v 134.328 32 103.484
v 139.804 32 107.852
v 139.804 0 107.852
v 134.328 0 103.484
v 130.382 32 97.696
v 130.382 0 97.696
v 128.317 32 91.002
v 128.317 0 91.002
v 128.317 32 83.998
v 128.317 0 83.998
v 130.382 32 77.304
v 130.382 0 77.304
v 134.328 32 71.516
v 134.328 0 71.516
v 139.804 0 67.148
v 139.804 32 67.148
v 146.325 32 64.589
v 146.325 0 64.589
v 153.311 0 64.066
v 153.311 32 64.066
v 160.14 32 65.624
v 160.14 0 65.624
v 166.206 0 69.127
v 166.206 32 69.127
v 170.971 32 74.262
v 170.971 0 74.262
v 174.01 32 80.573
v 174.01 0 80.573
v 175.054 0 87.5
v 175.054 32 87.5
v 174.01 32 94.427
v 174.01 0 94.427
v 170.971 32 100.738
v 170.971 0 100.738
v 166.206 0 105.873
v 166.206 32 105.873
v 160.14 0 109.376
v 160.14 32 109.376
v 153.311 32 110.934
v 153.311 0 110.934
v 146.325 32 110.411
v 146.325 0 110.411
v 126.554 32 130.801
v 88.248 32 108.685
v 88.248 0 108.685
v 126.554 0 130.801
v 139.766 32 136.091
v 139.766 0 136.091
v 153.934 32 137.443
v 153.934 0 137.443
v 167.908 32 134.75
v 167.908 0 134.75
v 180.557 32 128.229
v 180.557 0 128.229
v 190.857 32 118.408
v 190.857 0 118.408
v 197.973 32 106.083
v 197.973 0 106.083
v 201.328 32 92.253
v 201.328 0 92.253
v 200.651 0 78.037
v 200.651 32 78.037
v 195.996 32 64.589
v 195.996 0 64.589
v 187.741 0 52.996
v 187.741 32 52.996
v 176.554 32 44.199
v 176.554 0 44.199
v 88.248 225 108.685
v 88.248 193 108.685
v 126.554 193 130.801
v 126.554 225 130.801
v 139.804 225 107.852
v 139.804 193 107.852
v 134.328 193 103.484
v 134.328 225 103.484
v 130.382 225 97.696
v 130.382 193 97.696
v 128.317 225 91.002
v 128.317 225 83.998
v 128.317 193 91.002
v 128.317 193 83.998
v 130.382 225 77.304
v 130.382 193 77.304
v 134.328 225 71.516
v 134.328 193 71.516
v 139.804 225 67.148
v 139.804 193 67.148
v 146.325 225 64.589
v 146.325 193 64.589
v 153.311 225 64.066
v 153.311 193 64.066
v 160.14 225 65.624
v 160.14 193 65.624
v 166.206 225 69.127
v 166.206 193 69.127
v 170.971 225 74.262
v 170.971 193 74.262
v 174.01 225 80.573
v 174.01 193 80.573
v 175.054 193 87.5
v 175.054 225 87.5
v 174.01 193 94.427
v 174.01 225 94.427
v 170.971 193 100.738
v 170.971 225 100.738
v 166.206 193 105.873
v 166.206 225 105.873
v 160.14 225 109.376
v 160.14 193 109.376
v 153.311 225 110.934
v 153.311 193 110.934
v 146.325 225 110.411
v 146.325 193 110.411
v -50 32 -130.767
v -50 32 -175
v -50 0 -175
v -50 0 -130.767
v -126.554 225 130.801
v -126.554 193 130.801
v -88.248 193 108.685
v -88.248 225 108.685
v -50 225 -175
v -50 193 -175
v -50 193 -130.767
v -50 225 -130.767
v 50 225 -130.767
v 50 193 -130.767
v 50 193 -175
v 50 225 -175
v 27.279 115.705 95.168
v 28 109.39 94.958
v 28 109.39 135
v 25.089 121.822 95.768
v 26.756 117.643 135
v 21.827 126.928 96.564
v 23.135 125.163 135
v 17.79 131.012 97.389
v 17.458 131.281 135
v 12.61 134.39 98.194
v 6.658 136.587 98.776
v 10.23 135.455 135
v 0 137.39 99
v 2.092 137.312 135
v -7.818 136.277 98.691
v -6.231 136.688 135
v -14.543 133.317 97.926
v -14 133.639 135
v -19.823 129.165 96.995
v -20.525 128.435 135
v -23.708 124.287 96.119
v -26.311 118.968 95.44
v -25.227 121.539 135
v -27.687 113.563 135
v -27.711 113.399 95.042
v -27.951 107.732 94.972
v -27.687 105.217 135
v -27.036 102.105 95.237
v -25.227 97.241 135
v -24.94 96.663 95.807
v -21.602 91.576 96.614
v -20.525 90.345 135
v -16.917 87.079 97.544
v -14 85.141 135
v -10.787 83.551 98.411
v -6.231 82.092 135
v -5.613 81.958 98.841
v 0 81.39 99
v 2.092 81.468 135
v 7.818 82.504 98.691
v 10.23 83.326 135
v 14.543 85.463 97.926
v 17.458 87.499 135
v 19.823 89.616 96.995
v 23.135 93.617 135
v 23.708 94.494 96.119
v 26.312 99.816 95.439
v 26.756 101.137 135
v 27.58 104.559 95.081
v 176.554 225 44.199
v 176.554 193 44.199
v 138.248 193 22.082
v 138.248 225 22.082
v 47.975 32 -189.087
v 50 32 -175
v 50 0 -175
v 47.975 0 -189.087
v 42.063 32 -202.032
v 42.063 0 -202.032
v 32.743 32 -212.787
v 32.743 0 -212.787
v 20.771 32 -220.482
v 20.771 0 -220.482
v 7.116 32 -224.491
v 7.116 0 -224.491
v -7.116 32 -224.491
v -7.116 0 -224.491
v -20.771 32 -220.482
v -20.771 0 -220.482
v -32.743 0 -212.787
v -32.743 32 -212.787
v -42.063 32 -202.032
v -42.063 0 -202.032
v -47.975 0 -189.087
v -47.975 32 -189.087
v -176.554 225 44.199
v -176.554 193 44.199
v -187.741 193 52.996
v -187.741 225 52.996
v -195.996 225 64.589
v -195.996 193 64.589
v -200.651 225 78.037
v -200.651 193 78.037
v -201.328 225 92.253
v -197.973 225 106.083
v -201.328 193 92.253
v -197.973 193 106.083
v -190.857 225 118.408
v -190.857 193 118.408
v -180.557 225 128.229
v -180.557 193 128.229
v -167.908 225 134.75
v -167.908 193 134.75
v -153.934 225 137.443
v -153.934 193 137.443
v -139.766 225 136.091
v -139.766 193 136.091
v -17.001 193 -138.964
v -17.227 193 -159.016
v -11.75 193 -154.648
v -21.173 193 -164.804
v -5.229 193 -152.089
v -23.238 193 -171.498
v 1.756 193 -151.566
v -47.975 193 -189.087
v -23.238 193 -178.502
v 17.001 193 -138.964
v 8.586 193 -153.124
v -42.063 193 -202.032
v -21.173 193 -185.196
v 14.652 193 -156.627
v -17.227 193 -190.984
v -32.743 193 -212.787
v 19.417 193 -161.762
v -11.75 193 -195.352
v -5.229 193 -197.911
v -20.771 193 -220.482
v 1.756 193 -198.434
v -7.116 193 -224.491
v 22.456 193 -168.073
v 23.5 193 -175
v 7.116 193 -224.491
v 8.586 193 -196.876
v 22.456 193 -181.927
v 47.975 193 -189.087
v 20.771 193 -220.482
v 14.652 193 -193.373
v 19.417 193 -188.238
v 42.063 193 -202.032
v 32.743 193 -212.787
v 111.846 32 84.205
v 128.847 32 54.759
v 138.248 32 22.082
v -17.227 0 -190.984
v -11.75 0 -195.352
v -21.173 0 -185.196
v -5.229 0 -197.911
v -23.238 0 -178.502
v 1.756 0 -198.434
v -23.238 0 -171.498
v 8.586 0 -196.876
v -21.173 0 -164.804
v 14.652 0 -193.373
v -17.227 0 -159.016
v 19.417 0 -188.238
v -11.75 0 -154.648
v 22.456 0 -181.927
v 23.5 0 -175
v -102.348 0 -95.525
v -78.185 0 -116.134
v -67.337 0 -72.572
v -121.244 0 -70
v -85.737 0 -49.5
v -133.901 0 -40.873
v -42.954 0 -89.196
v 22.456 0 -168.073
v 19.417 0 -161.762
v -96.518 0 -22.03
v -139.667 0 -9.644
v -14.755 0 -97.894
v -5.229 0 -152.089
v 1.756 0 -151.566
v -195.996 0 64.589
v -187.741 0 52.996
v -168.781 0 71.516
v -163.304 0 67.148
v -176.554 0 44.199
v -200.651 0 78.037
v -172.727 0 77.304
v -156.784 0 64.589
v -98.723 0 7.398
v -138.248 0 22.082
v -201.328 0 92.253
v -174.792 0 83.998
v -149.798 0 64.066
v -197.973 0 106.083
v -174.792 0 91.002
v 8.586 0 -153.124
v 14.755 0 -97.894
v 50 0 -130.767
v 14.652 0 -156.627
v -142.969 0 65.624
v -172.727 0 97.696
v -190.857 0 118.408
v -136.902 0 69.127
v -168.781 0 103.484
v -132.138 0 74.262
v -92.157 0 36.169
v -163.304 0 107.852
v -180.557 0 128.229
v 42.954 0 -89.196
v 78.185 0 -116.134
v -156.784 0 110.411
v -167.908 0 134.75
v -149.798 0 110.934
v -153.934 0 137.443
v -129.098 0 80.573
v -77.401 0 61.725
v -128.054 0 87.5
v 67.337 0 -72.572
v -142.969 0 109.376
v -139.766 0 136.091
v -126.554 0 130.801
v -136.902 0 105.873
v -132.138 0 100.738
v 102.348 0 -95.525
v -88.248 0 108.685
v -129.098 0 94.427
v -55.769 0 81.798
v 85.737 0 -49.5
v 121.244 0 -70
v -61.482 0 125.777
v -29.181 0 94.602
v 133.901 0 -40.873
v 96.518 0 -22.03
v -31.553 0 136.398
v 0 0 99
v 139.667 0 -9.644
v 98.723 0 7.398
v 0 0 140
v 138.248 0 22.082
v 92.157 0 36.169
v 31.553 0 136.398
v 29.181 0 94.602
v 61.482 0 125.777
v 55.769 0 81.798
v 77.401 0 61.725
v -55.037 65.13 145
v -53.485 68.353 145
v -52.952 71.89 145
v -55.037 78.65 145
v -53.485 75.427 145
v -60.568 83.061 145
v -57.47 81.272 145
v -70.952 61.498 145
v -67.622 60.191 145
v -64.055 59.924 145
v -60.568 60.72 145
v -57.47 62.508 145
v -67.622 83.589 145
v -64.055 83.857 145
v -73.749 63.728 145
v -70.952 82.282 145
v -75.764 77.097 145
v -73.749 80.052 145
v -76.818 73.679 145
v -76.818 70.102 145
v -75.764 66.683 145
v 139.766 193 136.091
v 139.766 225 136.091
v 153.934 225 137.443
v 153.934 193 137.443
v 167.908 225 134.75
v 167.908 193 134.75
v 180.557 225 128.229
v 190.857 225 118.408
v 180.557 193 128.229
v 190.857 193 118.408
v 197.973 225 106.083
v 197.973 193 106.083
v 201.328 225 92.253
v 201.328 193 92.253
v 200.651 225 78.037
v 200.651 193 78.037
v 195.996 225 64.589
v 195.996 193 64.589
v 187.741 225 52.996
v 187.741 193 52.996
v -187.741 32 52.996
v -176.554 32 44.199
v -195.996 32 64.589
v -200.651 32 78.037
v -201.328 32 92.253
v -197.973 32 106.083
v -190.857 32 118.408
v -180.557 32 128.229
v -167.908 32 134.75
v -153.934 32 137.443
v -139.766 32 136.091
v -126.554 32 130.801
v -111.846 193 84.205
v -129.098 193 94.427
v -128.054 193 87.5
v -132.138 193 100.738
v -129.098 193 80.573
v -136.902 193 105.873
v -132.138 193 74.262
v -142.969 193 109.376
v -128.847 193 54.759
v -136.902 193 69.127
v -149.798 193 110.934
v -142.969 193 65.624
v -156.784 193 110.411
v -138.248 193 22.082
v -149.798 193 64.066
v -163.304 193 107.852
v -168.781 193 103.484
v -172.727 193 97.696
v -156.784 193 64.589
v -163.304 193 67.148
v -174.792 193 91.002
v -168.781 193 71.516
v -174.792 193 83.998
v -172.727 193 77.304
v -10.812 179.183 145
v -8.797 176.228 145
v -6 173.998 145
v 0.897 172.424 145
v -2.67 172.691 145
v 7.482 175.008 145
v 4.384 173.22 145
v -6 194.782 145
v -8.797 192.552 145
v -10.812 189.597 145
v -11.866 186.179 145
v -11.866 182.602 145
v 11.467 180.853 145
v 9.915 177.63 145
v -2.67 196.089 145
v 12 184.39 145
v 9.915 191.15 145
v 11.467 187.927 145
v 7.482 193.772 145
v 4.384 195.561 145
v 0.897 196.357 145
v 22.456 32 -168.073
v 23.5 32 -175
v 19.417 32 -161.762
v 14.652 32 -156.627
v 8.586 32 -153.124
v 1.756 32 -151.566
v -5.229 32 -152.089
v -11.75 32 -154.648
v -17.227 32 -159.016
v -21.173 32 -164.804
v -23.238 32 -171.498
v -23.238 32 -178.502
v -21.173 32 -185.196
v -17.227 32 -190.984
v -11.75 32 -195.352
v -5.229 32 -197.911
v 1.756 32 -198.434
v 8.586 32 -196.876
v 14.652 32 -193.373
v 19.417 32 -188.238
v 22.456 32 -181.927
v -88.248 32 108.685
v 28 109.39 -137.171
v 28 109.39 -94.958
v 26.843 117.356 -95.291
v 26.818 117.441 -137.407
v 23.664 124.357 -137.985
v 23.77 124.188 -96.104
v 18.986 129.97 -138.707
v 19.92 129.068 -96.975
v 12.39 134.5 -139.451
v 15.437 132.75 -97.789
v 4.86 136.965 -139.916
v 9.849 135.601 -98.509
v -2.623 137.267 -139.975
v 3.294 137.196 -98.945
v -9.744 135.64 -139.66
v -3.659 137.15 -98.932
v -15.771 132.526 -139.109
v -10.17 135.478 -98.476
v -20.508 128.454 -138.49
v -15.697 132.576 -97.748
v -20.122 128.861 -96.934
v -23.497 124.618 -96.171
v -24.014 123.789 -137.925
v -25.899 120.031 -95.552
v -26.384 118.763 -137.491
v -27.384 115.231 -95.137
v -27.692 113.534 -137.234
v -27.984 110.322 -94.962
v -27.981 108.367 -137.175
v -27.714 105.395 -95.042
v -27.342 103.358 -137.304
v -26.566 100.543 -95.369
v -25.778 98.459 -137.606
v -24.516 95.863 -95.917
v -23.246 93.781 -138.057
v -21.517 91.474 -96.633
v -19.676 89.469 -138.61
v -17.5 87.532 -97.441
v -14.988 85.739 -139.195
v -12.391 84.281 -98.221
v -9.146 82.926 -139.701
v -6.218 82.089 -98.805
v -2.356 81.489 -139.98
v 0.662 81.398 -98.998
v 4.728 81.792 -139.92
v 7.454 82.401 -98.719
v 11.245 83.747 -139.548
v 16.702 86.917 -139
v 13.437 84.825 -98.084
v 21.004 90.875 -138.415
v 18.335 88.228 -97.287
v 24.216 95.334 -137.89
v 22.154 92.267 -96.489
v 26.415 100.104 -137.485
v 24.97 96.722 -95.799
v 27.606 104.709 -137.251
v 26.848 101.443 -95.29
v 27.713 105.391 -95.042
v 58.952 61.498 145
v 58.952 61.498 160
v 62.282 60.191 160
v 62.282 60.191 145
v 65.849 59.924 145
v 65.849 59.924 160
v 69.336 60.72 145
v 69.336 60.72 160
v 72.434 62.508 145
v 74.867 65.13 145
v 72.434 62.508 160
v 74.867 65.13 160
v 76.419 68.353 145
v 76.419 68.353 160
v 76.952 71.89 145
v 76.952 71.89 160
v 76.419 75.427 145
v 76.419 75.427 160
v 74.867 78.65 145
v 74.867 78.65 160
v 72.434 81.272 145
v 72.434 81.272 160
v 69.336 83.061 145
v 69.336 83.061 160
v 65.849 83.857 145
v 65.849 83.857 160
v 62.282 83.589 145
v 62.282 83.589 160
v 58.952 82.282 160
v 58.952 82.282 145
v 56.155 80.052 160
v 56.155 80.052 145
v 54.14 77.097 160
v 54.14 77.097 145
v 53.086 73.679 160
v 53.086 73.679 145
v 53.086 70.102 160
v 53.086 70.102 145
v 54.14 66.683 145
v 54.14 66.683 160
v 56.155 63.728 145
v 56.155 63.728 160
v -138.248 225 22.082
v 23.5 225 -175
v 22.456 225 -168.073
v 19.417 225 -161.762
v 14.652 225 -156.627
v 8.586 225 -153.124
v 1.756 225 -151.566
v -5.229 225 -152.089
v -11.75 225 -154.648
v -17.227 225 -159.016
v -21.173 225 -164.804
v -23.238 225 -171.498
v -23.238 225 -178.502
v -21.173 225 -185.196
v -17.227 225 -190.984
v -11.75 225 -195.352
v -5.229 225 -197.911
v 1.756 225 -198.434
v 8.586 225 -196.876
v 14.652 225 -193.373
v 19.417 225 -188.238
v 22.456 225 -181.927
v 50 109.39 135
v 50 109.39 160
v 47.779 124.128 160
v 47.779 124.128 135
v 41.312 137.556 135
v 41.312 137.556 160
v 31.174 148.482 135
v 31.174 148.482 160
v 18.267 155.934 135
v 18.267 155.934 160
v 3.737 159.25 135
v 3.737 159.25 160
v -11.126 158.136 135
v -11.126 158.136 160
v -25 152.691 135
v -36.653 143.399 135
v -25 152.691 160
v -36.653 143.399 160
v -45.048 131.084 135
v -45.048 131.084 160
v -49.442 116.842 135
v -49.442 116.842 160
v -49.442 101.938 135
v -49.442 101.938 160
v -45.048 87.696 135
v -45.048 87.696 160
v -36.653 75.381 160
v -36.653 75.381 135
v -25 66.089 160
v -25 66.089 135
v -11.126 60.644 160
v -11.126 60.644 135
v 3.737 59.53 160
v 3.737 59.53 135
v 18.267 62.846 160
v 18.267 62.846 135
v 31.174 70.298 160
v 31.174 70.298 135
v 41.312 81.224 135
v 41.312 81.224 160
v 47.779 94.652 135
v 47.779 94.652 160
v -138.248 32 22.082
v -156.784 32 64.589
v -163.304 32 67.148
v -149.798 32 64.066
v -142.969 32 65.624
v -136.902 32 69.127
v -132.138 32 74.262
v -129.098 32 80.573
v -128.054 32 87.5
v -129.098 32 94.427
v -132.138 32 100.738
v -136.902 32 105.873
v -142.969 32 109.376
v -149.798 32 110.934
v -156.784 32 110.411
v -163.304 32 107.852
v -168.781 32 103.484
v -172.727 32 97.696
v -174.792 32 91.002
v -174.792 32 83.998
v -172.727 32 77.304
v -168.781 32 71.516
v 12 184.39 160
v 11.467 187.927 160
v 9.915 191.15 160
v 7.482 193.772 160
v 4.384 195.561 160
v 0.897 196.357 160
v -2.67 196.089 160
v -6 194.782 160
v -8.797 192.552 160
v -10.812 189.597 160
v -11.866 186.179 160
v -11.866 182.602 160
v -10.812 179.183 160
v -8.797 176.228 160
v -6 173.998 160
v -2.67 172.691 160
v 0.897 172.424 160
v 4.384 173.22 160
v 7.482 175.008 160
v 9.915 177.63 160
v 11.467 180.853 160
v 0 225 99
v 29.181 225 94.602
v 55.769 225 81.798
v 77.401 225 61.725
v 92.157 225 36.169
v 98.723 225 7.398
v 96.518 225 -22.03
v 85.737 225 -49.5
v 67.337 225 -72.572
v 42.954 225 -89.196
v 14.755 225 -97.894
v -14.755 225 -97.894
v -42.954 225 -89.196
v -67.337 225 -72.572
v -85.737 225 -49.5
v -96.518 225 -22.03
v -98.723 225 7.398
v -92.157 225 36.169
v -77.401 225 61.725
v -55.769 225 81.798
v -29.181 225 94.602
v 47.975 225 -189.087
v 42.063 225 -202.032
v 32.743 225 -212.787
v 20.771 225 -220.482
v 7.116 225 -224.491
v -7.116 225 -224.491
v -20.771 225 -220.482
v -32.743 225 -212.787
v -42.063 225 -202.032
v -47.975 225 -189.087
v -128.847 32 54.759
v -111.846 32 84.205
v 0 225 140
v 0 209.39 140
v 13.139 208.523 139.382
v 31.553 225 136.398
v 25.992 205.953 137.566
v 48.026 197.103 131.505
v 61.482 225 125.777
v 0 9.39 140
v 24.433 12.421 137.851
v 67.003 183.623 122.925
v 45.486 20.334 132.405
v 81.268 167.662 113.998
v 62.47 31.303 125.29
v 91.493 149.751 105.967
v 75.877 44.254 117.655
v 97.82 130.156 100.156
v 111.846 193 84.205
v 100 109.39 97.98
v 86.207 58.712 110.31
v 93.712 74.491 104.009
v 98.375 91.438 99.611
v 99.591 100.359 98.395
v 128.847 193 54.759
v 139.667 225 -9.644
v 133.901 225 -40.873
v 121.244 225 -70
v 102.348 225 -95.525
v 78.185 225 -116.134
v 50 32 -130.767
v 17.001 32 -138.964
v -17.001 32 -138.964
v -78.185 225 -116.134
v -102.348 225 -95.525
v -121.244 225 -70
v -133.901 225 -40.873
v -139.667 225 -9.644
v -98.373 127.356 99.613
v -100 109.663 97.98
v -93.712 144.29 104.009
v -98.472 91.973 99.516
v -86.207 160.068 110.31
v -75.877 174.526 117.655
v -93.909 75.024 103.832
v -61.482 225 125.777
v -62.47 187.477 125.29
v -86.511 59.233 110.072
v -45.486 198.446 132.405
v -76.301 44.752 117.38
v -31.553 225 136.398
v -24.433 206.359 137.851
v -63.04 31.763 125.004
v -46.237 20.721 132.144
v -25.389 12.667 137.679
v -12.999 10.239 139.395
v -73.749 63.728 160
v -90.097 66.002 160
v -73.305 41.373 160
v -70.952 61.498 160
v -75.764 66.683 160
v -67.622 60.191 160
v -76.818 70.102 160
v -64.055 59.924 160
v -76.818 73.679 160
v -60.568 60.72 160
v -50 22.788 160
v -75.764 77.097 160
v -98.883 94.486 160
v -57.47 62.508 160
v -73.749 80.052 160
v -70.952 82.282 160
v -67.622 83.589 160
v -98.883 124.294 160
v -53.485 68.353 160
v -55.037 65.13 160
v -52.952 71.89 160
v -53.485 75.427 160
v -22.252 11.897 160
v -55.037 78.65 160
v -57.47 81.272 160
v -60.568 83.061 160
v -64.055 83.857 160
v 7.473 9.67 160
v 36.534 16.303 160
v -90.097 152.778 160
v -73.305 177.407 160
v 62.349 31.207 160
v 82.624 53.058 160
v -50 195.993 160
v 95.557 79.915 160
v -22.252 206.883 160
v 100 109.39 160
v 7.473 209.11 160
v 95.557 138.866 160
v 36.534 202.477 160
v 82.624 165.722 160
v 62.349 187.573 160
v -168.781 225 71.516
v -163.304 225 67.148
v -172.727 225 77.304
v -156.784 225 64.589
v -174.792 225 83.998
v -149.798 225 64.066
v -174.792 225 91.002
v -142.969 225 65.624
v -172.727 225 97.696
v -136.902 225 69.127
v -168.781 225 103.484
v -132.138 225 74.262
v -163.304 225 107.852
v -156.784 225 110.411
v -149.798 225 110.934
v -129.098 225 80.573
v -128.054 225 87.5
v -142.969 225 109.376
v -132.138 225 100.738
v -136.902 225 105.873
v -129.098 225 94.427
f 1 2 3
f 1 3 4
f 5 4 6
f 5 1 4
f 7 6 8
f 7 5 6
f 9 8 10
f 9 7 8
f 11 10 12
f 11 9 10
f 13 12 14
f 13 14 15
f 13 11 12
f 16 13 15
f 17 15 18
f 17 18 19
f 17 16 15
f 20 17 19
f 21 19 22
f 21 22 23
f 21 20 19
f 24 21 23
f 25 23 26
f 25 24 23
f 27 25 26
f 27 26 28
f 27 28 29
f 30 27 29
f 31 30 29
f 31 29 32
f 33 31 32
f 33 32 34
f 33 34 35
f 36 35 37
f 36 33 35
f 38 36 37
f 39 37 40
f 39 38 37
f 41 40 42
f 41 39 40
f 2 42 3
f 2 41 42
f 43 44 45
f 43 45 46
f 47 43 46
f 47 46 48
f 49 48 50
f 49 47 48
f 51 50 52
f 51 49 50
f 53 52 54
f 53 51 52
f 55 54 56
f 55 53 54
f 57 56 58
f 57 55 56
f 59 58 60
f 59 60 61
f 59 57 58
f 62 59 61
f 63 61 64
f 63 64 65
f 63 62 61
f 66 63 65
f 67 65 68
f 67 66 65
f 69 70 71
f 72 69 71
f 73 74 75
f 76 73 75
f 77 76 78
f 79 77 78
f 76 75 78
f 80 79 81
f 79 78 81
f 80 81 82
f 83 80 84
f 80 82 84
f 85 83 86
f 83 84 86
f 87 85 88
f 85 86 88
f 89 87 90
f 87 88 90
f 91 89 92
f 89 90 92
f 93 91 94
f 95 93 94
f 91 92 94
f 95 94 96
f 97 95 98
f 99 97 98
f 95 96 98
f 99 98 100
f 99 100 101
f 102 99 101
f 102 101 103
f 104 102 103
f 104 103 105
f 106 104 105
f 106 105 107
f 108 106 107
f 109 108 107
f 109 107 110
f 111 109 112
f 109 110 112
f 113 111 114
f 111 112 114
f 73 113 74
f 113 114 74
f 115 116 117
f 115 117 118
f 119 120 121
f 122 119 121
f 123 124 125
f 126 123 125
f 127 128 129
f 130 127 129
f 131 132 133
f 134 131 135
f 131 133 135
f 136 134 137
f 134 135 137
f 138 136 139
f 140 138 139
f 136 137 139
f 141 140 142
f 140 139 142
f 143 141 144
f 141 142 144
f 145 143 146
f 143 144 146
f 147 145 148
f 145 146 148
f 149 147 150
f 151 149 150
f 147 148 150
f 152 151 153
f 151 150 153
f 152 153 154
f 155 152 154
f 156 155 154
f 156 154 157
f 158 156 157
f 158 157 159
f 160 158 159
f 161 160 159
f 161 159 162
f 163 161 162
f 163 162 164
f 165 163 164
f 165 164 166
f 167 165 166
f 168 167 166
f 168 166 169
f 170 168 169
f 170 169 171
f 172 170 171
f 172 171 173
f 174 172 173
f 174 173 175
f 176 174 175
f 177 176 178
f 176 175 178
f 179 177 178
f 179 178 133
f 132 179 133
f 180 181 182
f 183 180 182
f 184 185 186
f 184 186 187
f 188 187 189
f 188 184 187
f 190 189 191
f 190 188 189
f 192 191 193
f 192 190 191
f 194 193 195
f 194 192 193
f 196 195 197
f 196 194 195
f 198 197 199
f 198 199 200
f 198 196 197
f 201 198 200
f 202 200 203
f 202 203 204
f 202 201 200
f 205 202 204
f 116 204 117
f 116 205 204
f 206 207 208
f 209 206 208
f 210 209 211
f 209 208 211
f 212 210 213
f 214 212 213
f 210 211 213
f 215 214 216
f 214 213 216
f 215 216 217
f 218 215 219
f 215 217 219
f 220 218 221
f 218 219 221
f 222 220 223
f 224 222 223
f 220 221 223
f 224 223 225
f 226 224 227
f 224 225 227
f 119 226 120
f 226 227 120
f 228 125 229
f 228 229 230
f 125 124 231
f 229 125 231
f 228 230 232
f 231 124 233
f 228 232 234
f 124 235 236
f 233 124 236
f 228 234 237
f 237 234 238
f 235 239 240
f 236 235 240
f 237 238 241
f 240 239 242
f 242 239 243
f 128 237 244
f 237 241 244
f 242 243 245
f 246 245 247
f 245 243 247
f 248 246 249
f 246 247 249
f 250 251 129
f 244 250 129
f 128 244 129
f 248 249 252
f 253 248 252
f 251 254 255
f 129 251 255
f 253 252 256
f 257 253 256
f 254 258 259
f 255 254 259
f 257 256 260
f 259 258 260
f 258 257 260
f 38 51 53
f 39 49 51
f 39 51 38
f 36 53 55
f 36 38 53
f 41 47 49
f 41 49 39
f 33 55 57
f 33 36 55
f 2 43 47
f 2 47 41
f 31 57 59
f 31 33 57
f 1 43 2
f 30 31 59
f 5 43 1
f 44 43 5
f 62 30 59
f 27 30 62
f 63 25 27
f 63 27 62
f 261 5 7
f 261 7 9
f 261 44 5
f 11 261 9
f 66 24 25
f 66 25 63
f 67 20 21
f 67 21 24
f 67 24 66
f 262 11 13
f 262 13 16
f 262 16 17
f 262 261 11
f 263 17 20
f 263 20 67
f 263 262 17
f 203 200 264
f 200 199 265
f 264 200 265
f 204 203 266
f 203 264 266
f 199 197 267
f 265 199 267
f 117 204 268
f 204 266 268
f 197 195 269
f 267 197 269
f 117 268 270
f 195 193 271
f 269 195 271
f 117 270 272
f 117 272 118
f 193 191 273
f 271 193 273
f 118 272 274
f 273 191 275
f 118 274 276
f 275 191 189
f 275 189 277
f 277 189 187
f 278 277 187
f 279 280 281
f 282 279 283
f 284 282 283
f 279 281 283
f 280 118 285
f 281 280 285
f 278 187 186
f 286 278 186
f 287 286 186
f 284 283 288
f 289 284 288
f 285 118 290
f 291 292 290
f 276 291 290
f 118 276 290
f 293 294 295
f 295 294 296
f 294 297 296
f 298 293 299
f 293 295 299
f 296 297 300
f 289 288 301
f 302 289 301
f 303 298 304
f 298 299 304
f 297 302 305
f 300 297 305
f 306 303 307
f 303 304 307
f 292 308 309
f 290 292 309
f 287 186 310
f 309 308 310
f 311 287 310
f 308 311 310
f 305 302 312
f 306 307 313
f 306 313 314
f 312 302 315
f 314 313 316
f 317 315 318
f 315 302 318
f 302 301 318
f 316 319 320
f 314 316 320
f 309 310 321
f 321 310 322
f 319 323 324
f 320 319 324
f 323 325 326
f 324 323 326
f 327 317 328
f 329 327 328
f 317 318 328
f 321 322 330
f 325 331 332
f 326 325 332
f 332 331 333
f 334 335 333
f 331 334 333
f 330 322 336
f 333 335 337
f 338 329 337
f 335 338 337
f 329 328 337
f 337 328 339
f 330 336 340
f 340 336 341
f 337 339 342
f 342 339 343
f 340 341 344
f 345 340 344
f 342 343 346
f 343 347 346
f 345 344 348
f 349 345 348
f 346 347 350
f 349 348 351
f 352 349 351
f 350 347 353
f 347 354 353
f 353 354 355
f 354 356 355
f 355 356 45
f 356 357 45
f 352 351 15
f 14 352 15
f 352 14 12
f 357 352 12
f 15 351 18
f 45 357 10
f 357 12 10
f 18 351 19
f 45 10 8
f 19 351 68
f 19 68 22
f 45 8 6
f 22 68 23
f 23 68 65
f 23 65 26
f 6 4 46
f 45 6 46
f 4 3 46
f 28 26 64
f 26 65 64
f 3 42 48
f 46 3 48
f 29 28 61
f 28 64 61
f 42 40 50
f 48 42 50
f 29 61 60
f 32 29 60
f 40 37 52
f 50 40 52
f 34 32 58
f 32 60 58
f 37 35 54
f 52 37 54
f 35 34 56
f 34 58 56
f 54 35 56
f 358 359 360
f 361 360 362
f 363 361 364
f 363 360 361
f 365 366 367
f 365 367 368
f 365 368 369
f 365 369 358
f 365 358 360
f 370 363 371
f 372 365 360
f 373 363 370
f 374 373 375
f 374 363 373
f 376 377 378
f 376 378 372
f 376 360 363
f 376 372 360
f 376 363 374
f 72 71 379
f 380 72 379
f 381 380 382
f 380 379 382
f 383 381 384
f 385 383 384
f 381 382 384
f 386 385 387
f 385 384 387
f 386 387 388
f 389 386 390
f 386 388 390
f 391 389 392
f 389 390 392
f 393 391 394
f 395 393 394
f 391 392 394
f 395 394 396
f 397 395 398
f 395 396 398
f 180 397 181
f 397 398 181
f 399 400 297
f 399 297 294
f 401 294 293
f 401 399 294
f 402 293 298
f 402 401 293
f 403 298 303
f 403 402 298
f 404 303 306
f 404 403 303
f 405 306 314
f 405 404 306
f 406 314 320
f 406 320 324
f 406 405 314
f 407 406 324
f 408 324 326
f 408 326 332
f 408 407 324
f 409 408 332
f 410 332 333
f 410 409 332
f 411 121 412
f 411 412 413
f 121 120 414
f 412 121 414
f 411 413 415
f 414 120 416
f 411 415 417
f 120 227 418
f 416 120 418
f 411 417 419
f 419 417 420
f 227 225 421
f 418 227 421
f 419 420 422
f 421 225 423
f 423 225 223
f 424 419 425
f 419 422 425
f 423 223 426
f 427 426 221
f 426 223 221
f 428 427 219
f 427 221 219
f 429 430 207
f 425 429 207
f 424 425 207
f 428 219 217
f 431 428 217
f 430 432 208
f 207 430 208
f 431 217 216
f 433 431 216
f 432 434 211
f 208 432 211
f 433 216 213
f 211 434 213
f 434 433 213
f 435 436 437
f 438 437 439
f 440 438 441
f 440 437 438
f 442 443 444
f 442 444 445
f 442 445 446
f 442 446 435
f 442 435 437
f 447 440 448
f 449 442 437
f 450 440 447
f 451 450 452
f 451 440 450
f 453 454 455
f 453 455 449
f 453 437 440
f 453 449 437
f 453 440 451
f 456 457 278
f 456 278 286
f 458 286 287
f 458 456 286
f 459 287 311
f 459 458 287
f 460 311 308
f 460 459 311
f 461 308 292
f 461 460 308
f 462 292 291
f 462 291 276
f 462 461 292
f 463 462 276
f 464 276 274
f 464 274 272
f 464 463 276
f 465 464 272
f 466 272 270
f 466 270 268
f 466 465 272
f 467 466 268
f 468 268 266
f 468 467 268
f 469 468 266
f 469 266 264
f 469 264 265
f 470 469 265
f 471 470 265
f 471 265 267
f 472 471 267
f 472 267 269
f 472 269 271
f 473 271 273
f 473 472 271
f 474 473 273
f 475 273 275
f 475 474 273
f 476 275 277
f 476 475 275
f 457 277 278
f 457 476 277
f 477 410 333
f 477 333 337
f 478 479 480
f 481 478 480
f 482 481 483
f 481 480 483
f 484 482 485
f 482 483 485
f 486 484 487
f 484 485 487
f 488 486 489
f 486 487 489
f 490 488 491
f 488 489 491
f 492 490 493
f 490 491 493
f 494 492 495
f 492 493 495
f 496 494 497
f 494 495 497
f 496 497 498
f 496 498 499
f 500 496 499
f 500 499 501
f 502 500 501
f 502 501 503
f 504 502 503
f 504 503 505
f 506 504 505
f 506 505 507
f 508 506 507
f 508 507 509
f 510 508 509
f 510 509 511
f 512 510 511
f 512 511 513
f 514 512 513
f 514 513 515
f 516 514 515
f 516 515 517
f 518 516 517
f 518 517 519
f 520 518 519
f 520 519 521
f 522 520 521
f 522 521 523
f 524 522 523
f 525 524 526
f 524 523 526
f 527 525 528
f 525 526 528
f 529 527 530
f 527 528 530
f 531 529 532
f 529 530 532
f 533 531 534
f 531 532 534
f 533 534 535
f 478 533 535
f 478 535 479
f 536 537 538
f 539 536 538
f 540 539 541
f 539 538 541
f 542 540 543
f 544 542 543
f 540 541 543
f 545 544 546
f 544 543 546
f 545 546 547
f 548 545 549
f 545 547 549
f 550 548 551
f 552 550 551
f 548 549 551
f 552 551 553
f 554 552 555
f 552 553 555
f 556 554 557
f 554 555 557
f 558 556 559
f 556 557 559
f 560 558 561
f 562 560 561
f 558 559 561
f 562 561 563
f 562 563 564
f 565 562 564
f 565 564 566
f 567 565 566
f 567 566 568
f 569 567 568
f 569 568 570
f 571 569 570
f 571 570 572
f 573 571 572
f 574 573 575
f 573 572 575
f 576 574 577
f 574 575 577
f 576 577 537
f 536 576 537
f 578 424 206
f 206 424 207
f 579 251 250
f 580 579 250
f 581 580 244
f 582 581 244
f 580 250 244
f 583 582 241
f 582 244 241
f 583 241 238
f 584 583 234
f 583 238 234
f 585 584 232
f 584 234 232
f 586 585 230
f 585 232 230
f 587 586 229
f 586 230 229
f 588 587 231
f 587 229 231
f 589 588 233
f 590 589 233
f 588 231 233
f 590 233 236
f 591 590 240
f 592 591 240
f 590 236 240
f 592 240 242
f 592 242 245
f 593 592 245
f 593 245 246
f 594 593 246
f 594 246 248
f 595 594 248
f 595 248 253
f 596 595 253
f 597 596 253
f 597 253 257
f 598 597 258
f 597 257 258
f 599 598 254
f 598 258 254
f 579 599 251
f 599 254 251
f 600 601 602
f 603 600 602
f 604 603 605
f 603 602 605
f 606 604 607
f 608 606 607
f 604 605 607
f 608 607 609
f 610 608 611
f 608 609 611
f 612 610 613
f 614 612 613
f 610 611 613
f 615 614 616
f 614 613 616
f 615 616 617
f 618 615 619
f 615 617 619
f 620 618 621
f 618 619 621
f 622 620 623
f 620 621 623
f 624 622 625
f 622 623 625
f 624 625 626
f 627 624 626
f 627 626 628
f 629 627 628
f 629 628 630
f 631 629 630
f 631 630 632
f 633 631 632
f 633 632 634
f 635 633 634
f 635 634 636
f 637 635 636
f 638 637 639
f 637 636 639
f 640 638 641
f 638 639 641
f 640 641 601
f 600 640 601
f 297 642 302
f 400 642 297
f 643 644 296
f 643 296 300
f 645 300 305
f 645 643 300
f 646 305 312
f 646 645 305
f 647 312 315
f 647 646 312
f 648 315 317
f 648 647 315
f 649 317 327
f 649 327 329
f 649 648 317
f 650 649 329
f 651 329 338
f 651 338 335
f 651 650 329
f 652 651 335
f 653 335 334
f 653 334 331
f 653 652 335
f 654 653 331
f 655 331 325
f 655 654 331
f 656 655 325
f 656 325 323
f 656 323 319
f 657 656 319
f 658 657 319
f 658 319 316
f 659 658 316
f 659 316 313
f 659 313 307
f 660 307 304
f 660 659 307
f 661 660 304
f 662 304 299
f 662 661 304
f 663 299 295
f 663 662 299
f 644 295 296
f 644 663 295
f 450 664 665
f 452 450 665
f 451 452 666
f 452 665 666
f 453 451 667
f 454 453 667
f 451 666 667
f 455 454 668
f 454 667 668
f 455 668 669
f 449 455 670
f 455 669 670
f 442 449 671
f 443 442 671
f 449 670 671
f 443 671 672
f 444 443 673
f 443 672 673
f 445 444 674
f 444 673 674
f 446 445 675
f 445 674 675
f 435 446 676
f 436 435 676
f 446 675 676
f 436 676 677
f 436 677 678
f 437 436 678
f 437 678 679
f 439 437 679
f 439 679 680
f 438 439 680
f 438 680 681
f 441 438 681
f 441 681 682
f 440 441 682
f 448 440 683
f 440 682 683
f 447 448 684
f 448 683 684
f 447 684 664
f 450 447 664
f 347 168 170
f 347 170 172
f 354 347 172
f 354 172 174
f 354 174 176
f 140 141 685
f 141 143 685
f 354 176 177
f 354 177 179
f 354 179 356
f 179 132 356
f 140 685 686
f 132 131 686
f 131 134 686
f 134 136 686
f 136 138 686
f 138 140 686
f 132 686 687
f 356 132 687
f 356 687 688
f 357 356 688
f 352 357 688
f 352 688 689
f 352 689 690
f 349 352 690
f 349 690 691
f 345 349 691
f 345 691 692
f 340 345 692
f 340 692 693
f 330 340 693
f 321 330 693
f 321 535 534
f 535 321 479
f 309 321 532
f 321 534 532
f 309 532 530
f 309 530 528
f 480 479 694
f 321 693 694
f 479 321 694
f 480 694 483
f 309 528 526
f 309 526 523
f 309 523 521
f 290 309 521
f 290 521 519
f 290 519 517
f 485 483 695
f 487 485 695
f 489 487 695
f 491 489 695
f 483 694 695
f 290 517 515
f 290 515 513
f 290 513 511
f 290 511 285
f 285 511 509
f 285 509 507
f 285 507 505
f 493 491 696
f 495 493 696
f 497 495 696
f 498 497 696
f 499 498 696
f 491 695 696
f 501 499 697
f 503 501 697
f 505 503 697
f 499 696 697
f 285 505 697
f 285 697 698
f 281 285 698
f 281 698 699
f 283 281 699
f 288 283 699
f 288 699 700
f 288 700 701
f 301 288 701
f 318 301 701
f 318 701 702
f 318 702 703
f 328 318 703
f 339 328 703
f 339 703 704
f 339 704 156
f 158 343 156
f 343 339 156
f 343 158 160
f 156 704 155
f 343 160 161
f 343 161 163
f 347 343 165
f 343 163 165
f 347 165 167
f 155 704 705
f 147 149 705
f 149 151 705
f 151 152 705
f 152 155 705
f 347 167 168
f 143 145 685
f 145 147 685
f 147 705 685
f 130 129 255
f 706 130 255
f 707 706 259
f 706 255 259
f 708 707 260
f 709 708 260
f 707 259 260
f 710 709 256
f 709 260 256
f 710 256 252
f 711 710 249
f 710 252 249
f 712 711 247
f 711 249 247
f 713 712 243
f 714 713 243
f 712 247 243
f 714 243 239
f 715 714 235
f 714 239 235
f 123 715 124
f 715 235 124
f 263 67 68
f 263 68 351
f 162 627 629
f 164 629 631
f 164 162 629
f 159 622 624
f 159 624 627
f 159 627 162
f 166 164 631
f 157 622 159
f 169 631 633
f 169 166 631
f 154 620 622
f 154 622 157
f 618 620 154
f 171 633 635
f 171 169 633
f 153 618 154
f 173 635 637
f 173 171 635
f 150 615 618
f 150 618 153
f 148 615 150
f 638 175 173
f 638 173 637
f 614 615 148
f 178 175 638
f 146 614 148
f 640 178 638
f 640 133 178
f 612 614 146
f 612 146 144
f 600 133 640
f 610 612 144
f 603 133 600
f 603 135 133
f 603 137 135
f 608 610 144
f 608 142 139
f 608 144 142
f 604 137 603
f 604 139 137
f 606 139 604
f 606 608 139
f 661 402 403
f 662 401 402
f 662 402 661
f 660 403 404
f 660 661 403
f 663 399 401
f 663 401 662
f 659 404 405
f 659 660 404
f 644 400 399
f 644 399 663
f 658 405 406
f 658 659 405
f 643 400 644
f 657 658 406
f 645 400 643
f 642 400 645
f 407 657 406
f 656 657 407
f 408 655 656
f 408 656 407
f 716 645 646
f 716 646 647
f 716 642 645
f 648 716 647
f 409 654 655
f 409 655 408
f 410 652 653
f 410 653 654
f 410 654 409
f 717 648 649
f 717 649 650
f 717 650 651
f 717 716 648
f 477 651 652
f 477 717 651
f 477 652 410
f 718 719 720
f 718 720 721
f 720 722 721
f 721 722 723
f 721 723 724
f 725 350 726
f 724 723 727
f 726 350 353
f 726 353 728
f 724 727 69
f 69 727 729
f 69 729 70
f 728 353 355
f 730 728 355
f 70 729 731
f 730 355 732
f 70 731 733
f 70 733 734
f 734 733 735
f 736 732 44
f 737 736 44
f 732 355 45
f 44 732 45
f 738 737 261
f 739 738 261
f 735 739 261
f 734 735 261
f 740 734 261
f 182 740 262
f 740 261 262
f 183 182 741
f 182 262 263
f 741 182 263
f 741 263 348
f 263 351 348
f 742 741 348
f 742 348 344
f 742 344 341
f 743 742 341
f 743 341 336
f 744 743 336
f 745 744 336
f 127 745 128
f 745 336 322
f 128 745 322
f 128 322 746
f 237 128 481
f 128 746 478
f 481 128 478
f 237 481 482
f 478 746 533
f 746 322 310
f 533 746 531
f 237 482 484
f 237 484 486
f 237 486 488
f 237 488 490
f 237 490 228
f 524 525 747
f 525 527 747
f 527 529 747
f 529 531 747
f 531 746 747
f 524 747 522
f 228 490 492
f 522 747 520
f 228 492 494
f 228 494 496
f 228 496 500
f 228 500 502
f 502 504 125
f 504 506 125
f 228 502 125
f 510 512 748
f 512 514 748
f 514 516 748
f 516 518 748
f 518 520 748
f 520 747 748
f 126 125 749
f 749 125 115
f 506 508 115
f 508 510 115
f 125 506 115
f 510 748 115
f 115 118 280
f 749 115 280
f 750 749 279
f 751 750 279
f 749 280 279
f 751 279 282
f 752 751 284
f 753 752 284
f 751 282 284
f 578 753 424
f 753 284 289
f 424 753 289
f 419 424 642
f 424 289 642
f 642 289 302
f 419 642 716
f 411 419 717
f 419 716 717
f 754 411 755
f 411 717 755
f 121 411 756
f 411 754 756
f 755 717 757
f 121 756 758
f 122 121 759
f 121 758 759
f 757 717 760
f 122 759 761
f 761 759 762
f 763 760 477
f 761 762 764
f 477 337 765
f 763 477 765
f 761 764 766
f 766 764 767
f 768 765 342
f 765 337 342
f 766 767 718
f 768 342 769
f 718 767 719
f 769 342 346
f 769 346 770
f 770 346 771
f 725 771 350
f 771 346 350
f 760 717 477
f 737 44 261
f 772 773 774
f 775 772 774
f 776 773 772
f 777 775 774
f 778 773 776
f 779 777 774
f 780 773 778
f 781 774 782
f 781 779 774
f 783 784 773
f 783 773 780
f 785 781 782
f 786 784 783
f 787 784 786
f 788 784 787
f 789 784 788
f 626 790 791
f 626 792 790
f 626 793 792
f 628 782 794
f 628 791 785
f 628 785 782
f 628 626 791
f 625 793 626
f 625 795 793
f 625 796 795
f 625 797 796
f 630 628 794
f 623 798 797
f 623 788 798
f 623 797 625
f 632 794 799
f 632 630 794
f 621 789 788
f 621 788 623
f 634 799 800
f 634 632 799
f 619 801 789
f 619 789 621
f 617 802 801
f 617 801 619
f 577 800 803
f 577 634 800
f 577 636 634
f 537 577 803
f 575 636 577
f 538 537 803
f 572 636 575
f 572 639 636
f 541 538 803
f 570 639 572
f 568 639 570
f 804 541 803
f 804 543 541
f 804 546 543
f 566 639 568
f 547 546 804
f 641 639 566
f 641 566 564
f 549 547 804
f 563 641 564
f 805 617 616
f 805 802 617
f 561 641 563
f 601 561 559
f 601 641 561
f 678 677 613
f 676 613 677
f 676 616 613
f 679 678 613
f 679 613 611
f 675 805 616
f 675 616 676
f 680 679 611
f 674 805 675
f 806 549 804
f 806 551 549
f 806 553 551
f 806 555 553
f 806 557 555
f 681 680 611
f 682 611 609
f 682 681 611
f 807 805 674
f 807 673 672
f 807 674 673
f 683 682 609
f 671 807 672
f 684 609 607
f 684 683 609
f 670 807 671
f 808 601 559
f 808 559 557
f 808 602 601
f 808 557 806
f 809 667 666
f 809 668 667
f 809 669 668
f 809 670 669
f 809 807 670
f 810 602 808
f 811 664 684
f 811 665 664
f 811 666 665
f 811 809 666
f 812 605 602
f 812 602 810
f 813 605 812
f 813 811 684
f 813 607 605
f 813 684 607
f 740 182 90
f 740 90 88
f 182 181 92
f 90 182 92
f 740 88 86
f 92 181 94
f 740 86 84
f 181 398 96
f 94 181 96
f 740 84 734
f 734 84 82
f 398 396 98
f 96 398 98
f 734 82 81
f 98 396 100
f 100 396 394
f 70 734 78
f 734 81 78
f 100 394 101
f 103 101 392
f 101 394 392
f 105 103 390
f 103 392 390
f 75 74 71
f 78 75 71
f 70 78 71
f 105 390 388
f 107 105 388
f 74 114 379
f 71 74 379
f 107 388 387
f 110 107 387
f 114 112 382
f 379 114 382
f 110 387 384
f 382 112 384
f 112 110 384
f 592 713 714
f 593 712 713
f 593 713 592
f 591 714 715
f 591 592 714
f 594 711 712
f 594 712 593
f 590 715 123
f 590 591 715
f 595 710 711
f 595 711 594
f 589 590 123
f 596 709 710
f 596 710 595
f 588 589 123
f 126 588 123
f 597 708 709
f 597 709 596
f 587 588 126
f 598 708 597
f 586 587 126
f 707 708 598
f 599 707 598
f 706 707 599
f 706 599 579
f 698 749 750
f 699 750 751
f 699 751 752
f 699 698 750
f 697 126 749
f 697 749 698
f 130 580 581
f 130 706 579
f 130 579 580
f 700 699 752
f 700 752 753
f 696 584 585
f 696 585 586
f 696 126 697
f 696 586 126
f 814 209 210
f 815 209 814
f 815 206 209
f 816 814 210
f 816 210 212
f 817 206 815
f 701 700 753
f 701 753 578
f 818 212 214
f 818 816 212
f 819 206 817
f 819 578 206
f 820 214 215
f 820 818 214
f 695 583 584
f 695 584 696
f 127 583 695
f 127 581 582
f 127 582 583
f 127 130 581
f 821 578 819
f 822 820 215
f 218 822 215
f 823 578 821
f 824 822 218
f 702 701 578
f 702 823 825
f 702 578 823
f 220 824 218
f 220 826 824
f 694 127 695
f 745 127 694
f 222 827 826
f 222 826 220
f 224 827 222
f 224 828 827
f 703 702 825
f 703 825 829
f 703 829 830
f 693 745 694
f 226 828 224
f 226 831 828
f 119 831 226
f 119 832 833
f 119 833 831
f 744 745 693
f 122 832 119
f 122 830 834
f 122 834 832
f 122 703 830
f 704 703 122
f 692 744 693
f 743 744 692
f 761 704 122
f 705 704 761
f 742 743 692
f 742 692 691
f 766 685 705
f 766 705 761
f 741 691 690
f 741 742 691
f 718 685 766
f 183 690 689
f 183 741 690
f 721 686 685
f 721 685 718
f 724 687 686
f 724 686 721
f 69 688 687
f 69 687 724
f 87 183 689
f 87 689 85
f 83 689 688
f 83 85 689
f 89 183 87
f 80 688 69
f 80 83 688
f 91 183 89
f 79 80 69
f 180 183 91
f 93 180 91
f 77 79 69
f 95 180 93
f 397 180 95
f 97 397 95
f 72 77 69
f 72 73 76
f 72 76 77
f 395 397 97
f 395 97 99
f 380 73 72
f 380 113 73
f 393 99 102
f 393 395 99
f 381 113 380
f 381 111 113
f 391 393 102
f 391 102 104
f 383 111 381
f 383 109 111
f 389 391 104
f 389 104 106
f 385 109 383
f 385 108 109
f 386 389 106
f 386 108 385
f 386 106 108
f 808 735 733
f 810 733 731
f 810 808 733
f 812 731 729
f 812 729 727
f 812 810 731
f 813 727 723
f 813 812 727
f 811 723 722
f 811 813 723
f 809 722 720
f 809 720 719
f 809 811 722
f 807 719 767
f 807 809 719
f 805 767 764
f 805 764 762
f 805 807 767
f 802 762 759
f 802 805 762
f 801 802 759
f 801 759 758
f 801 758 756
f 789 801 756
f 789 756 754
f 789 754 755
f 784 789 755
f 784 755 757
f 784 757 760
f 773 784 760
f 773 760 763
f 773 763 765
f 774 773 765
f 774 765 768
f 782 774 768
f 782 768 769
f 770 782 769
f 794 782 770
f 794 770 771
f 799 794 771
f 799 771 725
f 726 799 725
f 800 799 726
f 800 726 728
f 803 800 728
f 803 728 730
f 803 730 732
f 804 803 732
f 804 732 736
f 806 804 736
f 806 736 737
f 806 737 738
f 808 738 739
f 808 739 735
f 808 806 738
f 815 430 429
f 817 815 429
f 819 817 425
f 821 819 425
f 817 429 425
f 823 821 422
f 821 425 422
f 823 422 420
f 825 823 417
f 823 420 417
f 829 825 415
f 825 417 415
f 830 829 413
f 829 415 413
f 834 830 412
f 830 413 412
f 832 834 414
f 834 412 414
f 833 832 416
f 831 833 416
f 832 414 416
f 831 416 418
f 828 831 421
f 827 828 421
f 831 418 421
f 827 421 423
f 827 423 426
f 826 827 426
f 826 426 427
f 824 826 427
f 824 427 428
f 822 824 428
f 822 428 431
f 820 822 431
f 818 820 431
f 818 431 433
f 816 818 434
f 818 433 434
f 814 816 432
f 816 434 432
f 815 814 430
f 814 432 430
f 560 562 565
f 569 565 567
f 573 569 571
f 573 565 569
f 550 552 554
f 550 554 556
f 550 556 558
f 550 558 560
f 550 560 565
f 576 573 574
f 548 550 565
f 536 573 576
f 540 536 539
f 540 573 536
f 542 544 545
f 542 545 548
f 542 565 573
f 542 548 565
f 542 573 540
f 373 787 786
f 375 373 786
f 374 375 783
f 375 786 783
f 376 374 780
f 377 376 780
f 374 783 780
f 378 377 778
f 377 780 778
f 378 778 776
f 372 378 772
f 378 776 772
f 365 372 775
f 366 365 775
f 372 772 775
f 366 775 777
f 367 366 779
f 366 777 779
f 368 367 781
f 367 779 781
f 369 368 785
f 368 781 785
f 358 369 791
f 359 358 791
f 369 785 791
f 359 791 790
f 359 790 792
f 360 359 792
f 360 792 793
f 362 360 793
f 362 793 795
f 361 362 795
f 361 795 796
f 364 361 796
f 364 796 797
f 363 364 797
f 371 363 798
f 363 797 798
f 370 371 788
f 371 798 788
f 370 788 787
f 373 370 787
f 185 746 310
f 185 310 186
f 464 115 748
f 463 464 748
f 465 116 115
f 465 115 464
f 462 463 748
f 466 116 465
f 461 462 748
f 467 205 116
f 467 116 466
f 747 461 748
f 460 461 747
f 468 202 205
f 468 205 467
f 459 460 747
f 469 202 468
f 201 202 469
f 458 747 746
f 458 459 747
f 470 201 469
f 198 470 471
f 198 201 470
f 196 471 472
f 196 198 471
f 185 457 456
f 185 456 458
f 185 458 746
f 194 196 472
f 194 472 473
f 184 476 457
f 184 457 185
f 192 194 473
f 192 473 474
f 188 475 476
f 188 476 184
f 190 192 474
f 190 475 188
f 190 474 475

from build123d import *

# Parameters (mm, degrees)
SKETCH1_R                = 140
BOSS_EXTRUDE1_DEPTH      = 225
SKETCH2_R                = 99
CUT_EXTRUDE1_DEPTH       = 300.708191413
BOSS_EXTRUDE2_START      = -32
BOSS_EXTRUDE2_DEPTH      = 32
CIRPATTERN1_COUNT        = 3
CIRPATTERN2_START        = -32
CIRPATTERN2_COPY_1_DEPTH = 32
CIRPATTERN2_COPY_2_DEPTH = 32
CIRPATTERN2_COPY_3_DEPTH = 32
CIRPATTERN2_COPY_4_DEPTH = 32
BOSS_EXTRUDE3_REACH      = 491.361
BOSS_EXTRUDE3_END_RADIUS = 140
SKETCH5_R                = 100
SKETCH6_R                = 50
CUT_EXTRUDE2_DEPTH       = 25
SKETCH9_R                = 28
CUT_EXTRUDE3_DEPTH       = 490.361006427
SKETCH11_R               = 12
CUT_EXTRUDE4_DEPTH       = 15
CIRPATTERN4_COUNT        = 3


with BuildPart() as part:
    # Sketch1 → Boss-Extrude1 (new body)
    with BuildSketch(Plane(origin=(0, 0, 0), x_dir=(1, 0, 0), z_dir=(0, 1, 0))):
        with Locations(Location((0, 0, 0), (0, 0, 270))):
            Circle(SKETCH1_R)
    extrude(amount=BOSS_EXTRUDE1_DEPTH)

    # Sketch2 → Cut-Extrude1 (cut, through all)
    with BuildSketch(Plane(origin=(0, 225, 0), x_dir=(1, 0, 0), z_dir=(0, 1, 0))):
        with Locations(Location((0, 0, 0), (0, 0, 270))):
            Circle(SKETCH2_R)
    extrude(amount=-CUT_EXTRUDE1_DEPTH, mode=Mode.SUBTRACT)

    # Sketch3 → Boss-Extrude2 (add)
    with BuildSketch(Plane(origin=(0, 225, 0), x_dir=(1, 0, 0), z_dir=(0, 1, 0)).offset(BOSS_EXTRUDE2_START)):
        with BuildLine():
            ThreePointArc((50, 175), (0, 225), (-50, 175))
            Line((-50, 175), (-50, 130.766968306))
            ThreePointArc((-50, 130.766968306), (0, 140), (50, 130.766968306))
            Line((50, 130.766968306), (50, 175))
        make_face()
        with BuildLine():
            ThreePointArc((-23.5, 175), (0, 198.5), (23.5, 175))
            ThreePointArc((23.5, 175), (0, 151.5), (-23.5, 175))
        make_face(mode=Mode.SUBTRACT)
    boss_extrude2 = extrude(amount=BOSS_EXTRUDE2_DEPTH)

    # CirPattern1: Boss-Extrude2 ×3 about axis
    cirpattern1_axis = Axis((0, 0, 0), (0, 1, 0))
    for i in range(1, CIRPATTERN1_COUNT):
        add(boss_extrude2.rotate(cirpattern1_axis, i * 360 / CIRPATTERN1_COUNT))

    # Mirror3: Boss-Extrude2 across plane
    add(boss_extrude2.mirror(Plane(origin=(0, 112.5, 0), x_dir=(0, 0, 1), z_dir=(0, -1, 0))))

    # CirPattern2 copy 1 sketch → CirPattern2 copy 1 (add)
    with BuildSketch(Plane(origin=(0, 0, 0), x_dir=(-0.4999999999999998, 0, 0.8660254037844387), z_dir=(0, -1, 0)).offset(CIRPATTERN2_START)):
        with BuildLine():
            ThreePointArc((50, -175), (0, -225), (-50, -175))
            Line((-50, -175), (-50, -130.766968306))
            ThreePointArc((-50, -130.766968306), (0, -140), (50, -130.766968306))
            Line((50, -130.766968306), (50, -175))
        make_face()
        with BuildLine():
            ThreePointArc((-23.5, -175), (0, -198.5), (23.5, -175))
            ThreePointArc((23.5, -175), (0, -151.5), (-23.5, -175))
        make_face(mode=Mode.SUBTRACT)
    extrude(amount=CIRPATTERN2_COPY_1_DEPTH)

    # CirPattern2 copy 2 sketch → CirPattern2 copy 2 (add)
    with BuildSketch(Plane(origin=(0, 0, 0), x_dir=(-0.5000000000000004, 0, -0.8660254037844384), z_dir=(0, -1, 0)).offset(CIRPATTERN2_START)):
        with BuildLine():
            ThreePointArc((50, -175), (0, -225), (-50, -175))
            Line((-50, -175), (-50, -130.766968306))
            ThreePointArc((-50, -130.766968306), (0, -140), (50, -130.766968306))
            Line((50, -130.766968306), (50, -175))
        make_face()
        with BuildLine():
            ThreePointArc((-23.5, -175), (0, -198.5), (23.5, -175))
            ThreePointArc((23.5, -175), (0, -151.5), (-23.5, -175))
        make_face(mode=Mode.SUBTRACT)
    extrude(amount=CIRPATTERN2_COPY_2_DEPTH)

    # CirPattern2 copy 3 sketch → CirPattern2 copy 3 (add)
    with BuildSketch(Plane(origin=(0, 225, 0), x_dir=(-0.4999999999999998, 0, 0.8660254037844387), z_dir=(0, 1, 0)).offset(CIRPATTERN2_START)):
        with BuildLine():
            ThreePointArc((50, 175), (0, 225), (-50, 175))
            Line((-50, 175), (-50, 130.766968306))
            ThreePointArc((-50, 130.766968306), (0, 140), (50, 130.766968306))
            Line((50, 130.766968306), (50, 175))
        make_face()
        with BuildLine():
            ThreePointArc((-23.5, 175), (0, 198.5), (23.5, 175))
            ThreePointArc((23.5, 175), (0, 151.5), (-23.5, 175))
        make_face(mode=Mode.SUBTRACT)
    extrude(amount=CIRPATTERN2_COPY_3_DEPTH)

    # CirPattern2 copy 4 sketch → CirPattern2 copy 4 (add)
    with BuildSketch(Plane(origin=(0, 225, 0), x_dir=(-0.5000000000000004, 0, -0.8660254037844384), z_dir=(0, 1, 0)).offset(CIRPATTERN2_START)):
        with BuildLine():
            ThreePointArc((50, 175), (0, 225), (-50, 175))
            Line((-50, 175), (-50, 130.766968306))
            ThreePointArc((-50, 130.766968306), (0, 140), (50, 130.766968306))
            Line((50, 130.766968306), (50, 175))
        make_face()
        with BuildLine():
            ThreePointArc((-23.5, 175), (0, 198.5), (23.5, 175))
            ThreePointArc((23.5, 175), (0, 151.5), (-23.5, 175))
        make_face(mode=Mode.SUBTRACT)
    extrude(amount=CIRPATTERN2_COPY_4_DEPTH)

    # Boss-Extrude3: up to this cylinder (the profile starts outside it)
    boss_extrude3_end = Plane(origin=(0, 109.390064, 0), z_dir=(0, -1, 0)) * Cylinder(BOSS_EXTRUDE3_END_RADIUS, 1263.722, mode=Mode.PRIVATE)
    # Sketch5 → Boss-Extrude3 (add, up to the surface)
    with BuildSketch(Plane.XY.offset(160), mode=Mode.PRIVATE) as boss_extrude3_sk1:
        with Locations((0, 109.390064354)):
            Circle(SKETCH5_R)
    boss_extrude3_tool1 = extrude(boss_extrude3_sk1.sketch, amount=-BOSS_EXTRUDE3_REACH, mode=Mode.PRIVATE) - boss_extrude3_end
    add(boss_extrude3_tool1.solids().sort_by_distance((0, 109.390064, 160))[0])

    # Sketch6 → Cut-Extrude2 (cut)
    with BuildSketch(Plane.XY.offset(160)):
        with Locations((0, 109.390064354)):
            Circle(SKETCH6_R)
    extrude(amount=-CUT_EXTRUDE2_DEPTH, mode=Mode.SUBTRACT)

    # Sketch9 → Cut-Extrude3 (cut, through all)
    with BuildSketch(Plane.XY.offset(160)):
        with Locations((0, 109.390064354)):
            Circle(SKETCH9_R)
    extrude(amount=-CUT_EXTRUDE3_DEPTH, mode=Mode.SUBTRACT)

    # Sketch11 → Cut-Extrude4 (cut)
    with BuildSketch(Plane.XY.offset(160)):
        with Locations((0, 184.390064354)):
            Circle(SKETCH11_R)
    cut_extrude4 = extrude(amount=-CUT_EXTRUDE4_DEPTH, mode=Mode.SUBTRACT)

    # CirPattern4: Cut-Extrude4 ×3 about axis
    cirpattern4_axis = Axis((0, 109.390064354, 0), (0, 0, 1))
    for i in range(1, CIRPATTERN4_COUNT):
        add(cut_extrude4.rotate(cirpattern4_axis, i * 360 / CIRPATTERN4_COUNT), mode=Mode.SUBTRACT)


solid = part.part
